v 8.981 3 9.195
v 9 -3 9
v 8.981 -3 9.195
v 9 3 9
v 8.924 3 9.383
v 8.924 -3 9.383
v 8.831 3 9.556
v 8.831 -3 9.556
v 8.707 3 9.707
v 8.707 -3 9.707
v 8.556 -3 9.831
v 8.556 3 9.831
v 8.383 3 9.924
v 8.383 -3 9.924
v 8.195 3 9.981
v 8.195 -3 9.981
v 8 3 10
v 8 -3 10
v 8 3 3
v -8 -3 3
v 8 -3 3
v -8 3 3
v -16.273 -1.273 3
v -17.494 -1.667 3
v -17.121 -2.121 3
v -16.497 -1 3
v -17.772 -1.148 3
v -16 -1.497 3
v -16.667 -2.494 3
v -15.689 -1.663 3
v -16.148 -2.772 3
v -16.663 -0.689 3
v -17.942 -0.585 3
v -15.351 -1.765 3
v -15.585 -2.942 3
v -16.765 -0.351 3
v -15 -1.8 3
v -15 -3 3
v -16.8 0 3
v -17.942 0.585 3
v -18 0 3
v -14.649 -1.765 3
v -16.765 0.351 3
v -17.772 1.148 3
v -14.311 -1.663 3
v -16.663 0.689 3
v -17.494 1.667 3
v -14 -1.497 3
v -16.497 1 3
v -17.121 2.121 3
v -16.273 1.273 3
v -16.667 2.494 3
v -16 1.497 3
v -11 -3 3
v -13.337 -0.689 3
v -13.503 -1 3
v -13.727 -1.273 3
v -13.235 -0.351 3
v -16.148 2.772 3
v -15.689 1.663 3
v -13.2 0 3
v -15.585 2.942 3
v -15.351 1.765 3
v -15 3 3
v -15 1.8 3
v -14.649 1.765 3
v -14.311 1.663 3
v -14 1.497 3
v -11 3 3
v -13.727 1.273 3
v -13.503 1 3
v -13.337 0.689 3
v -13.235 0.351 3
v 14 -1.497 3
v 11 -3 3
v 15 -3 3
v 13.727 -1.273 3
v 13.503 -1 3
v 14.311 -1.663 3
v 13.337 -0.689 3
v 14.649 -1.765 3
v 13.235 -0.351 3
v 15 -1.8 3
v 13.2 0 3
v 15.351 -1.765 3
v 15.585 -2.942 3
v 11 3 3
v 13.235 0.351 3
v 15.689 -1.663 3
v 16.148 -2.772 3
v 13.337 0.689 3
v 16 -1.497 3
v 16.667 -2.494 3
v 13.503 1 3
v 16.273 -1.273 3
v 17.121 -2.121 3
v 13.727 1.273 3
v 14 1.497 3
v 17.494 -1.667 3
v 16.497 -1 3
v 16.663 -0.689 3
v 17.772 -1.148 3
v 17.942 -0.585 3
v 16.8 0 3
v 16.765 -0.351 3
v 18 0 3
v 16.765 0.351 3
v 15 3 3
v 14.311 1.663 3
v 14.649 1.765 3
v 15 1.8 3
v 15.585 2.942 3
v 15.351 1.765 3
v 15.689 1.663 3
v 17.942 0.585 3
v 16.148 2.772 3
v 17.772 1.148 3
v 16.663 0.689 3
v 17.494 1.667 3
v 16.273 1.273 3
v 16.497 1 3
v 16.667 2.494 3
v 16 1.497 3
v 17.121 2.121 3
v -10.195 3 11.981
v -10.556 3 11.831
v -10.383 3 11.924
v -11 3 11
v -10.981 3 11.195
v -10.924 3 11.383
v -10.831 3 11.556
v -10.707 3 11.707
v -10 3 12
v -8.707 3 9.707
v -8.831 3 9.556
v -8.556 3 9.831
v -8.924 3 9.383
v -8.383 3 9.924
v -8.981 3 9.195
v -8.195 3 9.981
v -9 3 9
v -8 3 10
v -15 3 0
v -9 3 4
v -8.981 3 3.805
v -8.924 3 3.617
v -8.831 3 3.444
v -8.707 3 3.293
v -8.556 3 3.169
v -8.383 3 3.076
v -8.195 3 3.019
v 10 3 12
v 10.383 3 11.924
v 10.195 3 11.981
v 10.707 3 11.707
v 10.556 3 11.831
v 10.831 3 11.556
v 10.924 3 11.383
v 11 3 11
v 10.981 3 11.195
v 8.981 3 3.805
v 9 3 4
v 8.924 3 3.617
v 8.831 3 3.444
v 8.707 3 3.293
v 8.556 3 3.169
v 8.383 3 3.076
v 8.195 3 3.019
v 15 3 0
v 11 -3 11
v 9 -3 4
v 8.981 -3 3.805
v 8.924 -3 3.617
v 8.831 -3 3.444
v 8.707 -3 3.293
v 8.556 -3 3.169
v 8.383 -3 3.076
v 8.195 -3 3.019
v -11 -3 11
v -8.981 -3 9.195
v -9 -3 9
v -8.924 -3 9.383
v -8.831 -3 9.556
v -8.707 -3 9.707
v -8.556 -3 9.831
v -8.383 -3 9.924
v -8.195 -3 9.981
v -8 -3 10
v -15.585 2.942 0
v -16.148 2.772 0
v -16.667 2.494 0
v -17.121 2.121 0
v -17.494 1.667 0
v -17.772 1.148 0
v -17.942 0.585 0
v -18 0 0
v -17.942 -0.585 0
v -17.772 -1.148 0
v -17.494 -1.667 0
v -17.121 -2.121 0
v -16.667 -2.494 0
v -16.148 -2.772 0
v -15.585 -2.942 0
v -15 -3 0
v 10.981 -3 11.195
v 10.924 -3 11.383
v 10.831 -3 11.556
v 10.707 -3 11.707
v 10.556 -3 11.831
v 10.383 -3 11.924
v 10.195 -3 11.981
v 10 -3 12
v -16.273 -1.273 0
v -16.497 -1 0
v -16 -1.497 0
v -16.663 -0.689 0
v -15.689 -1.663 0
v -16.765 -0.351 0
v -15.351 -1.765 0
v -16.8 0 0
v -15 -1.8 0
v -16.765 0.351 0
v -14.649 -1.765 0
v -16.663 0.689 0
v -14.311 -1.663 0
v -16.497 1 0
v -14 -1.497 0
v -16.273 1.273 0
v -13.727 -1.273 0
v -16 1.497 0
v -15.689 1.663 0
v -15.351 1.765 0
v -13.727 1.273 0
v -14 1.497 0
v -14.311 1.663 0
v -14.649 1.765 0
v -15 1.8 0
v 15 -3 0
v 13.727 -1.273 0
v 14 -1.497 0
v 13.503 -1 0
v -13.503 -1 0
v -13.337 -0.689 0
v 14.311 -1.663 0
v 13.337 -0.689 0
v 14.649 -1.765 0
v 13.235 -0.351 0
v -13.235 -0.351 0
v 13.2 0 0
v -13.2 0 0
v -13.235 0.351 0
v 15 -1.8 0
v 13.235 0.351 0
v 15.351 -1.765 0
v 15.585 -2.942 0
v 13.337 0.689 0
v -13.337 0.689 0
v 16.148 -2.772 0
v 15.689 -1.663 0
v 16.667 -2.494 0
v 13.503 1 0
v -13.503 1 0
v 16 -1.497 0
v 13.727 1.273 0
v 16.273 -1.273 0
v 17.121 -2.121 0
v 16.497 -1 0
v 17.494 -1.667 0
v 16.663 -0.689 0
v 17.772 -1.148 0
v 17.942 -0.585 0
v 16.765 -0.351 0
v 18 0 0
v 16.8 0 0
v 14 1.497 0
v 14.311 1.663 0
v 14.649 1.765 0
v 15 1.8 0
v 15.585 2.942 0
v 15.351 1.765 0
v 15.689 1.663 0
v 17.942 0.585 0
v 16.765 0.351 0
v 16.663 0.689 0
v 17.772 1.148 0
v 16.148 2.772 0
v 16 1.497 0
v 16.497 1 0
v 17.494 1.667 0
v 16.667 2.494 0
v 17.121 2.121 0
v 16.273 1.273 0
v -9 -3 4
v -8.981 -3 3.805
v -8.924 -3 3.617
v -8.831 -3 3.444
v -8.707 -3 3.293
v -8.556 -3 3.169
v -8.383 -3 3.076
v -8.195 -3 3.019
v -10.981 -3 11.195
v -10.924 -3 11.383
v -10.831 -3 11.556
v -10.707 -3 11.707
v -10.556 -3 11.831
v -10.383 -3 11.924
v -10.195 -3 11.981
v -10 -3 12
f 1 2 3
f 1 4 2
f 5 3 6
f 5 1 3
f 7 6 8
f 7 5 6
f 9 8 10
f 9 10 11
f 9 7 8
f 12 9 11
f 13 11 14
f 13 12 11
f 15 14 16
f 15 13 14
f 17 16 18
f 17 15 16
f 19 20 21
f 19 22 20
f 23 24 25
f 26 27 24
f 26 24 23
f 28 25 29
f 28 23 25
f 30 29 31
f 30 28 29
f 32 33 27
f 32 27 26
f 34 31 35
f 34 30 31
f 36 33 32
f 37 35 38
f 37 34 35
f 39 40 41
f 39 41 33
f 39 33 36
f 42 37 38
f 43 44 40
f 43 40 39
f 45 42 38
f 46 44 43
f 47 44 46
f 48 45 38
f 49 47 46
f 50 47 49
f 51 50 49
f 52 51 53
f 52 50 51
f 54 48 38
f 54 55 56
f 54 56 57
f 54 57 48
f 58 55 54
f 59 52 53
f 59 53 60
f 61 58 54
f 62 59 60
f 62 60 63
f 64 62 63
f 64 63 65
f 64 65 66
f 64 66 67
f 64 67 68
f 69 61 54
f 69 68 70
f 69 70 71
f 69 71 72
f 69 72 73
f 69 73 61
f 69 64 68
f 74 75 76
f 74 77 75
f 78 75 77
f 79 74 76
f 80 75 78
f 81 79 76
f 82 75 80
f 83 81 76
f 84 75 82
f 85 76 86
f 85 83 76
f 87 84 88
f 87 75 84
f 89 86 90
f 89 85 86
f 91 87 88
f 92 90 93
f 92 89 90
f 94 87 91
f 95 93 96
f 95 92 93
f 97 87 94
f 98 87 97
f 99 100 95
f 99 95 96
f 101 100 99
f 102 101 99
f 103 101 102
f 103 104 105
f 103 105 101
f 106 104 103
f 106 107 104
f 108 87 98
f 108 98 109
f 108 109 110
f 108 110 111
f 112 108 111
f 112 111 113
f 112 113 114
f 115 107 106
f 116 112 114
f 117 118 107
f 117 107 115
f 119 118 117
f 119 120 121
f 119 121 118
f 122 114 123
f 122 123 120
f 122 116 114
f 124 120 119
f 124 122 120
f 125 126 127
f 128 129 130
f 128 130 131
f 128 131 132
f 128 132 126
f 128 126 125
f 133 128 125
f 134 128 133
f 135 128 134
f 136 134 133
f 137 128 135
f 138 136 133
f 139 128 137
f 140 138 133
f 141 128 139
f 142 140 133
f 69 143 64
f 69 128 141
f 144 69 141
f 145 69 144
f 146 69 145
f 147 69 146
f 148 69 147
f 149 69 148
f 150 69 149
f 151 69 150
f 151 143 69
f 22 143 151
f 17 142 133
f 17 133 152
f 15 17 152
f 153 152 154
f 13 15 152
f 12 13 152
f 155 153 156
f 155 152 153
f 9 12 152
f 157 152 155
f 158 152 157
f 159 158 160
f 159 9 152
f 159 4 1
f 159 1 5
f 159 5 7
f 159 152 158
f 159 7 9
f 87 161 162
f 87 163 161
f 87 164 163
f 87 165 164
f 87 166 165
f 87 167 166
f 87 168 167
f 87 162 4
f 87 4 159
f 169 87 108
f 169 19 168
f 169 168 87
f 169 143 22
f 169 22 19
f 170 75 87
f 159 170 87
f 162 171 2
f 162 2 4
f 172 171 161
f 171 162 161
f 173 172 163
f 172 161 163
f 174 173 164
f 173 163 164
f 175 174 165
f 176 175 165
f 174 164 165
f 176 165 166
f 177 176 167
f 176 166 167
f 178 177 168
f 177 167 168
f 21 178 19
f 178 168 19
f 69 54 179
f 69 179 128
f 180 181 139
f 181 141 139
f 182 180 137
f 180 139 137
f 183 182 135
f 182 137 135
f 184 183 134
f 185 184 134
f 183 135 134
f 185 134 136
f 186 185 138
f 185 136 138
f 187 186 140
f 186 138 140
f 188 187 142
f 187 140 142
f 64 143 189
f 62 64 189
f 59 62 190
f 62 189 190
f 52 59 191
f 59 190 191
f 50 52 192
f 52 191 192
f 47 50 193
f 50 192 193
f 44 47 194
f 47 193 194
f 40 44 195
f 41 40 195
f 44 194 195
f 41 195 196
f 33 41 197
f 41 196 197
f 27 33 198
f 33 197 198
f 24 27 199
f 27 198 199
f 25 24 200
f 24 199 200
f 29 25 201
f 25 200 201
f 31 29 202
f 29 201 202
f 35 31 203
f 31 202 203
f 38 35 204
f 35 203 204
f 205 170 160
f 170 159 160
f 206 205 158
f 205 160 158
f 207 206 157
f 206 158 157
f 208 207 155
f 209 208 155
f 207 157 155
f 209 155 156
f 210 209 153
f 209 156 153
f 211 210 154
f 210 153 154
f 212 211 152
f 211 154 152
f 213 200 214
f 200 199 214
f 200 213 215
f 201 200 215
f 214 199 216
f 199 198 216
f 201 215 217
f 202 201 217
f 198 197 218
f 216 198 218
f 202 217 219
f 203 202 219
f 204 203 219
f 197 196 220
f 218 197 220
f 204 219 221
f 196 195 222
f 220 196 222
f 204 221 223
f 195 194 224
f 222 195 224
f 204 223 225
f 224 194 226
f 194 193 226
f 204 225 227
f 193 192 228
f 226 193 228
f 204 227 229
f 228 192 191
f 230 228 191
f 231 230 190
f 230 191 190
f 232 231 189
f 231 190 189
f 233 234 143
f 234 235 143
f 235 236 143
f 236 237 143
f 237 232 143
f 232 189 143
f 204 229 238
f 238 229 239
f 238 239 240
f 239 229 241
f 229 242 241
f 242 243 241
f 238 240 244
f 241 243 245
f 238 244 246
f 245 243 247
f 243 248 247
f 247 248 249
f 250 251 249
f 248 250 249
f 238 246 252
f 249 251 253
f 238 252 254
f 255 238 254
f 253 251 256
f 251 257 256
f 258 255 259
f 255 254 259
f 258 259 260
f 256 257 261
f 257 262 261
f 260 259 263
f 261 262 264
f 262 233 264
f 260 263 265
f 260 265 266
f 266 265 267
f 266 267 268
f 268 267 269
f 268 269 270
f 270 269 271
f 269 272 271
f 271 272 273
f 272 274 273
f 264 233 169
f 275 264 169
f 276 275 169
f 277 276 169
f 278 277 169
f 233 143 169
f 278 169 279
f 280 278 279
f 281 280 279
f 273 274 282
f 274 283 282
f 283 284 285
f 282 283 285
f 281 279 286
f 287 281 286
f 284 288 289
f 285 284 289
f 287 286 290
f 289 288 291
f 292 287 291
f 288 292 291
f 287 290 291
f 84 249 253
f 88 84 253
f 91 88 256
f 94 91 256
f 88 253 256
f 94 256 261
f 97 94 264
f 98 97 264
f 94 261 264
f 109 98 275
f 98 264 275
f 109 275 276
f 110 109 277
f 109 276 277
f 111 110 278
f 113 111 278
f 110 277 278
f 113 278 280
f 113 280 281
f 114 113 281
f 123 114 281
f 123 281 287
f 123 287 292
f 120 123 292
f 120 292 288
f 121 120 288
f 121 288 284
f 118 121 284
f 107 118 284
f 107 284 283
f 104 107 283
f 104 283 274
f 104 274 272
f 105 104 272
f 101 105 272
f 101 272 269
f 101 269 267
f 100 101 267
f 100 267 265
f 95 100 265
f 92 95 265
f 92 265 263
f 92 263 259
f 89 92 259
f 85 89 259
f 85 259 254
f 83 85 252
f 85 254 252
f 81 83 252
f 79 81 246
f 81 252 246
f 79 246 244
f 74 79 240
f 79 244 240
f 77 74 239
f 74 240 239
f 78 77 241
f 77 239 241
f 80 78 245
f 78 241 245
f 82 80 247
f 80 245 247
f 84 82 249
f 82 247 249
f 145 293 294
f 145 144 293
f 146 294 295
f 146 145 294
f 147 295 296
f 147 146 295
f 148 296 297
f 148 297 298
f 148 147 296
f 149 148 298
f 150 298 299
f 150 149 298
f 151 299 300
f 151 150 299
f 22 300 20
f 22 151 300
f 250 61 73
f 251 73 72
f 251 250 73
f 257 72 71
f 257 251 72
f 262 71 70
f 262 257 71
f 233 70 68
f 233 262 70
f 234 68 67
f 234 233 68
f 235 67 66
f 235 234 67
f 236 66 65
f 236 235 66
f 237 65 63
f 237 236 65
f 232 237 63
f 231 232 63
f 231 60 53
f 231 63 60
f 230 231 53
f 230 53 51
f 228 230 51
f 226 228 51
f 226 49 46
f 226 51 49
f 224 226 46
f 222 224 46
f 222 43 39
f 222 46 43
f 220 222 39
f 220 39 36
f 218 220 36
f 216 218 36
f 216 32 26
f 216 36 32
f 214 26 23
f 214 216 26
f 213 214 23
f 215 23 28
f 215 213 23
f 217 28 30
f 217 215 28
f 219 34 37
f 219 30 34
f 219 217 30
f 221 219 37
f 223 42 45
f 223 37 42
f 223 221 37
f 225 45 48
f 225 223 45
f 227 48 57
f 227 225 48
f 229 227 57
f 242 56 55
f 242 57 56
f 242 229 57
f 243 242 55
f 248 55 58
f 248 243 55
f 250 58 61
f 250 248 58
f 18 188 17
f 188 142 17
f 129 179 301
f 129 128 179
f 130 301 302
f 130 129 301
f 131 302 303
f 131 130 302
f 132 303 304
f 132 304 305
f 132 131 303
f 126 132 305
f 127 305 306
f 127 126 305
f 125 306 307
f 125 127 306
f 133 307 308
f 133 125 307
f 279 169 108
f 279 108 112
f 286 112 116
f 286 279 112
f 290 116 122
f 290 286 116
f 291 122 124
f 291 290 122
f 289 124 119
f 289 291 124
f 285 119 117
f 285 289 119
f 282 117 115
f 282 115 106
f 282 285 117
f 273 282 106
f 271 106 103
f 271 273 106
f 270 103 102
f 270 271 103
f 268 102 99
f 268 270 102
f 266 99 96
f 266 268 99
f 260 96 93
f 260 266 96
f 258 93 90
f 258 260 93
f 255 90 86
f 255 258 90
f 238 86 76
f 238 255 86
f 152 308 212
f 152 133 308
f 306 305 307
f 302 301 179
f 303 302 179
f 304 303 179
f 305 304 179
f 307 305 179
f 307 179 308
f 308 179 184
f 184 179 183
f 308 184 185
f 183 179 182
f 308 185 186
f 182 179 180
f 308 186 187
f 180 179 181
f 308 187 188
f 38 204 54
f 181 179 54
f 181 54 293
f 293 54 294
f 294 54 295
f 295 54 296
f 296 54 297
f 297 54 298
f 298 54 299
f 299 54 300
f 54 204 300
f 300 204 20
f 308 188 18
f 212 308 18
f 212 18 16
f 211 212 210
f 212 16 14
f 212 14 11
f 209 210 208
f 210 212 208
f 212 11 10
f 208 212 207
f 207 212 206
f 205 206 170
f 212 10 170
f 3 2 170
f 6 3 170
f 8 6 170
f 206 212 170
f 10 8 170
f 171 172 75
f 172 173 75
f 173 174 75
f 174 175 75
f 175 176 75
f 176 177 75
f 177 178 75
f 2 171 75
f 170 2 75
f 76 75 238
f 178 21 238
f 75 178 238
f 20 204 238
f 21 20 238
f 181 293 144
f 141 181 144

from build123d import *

# Parameters (mm, degrees)
CYLINDER001_R     = 1.8
CYLINDER001_DEPTH = 10
BOX002_W          = 18
BOX002_H          = 6
BOX002_DEPTH      = 7
FILLET_R          = 1
CYLINDER_R        = 3
CYLINDER_DEPTH    = 3
BOX_W             = 30
BOX_H             = 6
BOX_DEPTH         = 3
BOX001_W          = 22
BOX001_H          = 6
BOX001_DEPTH      = 9
FILLET001_R       = 1


with BuildPart() as bolt_hole:
    # Cylinder001 → Cylinder001 (new body)
    with BuildSketch(Plane(origin=(-15, 0, 0), x_dir=(1, 0, 0), z_dir=(0, 0, 1))):
        Circle(CYLINDER001_R)
    extrude(amount=CYLINDER001_DEPTH)


with BuildPart() as central_hole_fillet:
    # Box002 → Box002 (new body)
    with BuildSketch(Plane(origin=(-9, -3, 3), x_dir=(1, 0, 0), z_dir=(0, 0, 1))):
        with Locations((9, 3)):
            Rectangle(BOX002_W, BOX002_H)
    extrude(amount=BOX002_DEPTH)

    # Fillet
    fillet_edges = [central_hole_fillet.edges().sort_by_distance(p)[0] for p in [
        (-9, 0, 10),
        (-9, 0, 3),
        (9, 0, 10),
        (9, 0, 3),
    ]]
    fillet(fillet_edges, radius=FILLET_R)


with BuildPart() as extract_fusion:
    # Part__Mirroring001: instance of bolt hole
    add(bolt_hole.part.mirror(Plane(origin=(0, 0, 0), x_dir=(0, -1, 0), z_dir=(1, 0, 0))))

    # Fusion001: union bolt hole, central hole fillet
    add(bolt_hole.part)
    add(central_hole_fillet.part)


with BuildPart() as end_cylinder:
    # Cylinder → Cylinder (new body)
    with BuildSketch(Plane(origin=(-15, 0, 0), x_dir=(1, 0, 0), z_dir=(0, 0, 1))):
        Circle(CYLINDER_R)
    extrude(amount=CYLINDER_DEPTH)


with BuildPart() as part_mirroring:
    # Part__Mirroring: instance of end cylinder
    add(end_cylinder.part.mirror(Plane(origin=(0, 0, 0), x_dir=(0, -1, 0), z_dir=(1, 0, 0))))


with BuildPart() as bottom_cube:
    # Box → Box (new body)
    with BuildSketch(Plane(origin=(-15, -3, 0), x_dir=(1, 0, 0), z_dir=(0, 0, 1))):
        with Locations((15, 3)):
            Rectangle(BOX_W, BOX_H)
    extrude(amount=BOX_DEPTH)


with BuildPart() as top_cube_fillet:
    # Box001 → Box001 (new body)
    with BuildSketch(Plane(origin=(-11, -3, 3), x_dir=(1, 0, 0), z_dir=(0, 0, 1))):
        with Locations((11, 3)):
            Rectangle(BOX001_W, BOX001_H)
    extrude(amount=BOX001_DEPTH)

    # Fillet001
    fillet001_edges = [top_cube_fillet.edges().sort_by_distance(p)[0] for p in [
        (-11, 0, 12),
        (11, 0, 12),
    ]]
    fillet(fillet001_edges, radius=FILLET001_R)


with BuildPart() as wire_holder:
    # Fusion base: copy of end cylinder
    add(end_cylinder.part)

    # Fusion: union Part__Mirroring, bottom cube, top cube fillet
    add(part_mirroring.part)
    add(bottom_cube.part)
    add(top_cube_fillet.part)

    # Cut: cut extract fusion
    add(extract_fusion.part, mode=Mode.SUBTRACT)


solid = wire_holder.part
